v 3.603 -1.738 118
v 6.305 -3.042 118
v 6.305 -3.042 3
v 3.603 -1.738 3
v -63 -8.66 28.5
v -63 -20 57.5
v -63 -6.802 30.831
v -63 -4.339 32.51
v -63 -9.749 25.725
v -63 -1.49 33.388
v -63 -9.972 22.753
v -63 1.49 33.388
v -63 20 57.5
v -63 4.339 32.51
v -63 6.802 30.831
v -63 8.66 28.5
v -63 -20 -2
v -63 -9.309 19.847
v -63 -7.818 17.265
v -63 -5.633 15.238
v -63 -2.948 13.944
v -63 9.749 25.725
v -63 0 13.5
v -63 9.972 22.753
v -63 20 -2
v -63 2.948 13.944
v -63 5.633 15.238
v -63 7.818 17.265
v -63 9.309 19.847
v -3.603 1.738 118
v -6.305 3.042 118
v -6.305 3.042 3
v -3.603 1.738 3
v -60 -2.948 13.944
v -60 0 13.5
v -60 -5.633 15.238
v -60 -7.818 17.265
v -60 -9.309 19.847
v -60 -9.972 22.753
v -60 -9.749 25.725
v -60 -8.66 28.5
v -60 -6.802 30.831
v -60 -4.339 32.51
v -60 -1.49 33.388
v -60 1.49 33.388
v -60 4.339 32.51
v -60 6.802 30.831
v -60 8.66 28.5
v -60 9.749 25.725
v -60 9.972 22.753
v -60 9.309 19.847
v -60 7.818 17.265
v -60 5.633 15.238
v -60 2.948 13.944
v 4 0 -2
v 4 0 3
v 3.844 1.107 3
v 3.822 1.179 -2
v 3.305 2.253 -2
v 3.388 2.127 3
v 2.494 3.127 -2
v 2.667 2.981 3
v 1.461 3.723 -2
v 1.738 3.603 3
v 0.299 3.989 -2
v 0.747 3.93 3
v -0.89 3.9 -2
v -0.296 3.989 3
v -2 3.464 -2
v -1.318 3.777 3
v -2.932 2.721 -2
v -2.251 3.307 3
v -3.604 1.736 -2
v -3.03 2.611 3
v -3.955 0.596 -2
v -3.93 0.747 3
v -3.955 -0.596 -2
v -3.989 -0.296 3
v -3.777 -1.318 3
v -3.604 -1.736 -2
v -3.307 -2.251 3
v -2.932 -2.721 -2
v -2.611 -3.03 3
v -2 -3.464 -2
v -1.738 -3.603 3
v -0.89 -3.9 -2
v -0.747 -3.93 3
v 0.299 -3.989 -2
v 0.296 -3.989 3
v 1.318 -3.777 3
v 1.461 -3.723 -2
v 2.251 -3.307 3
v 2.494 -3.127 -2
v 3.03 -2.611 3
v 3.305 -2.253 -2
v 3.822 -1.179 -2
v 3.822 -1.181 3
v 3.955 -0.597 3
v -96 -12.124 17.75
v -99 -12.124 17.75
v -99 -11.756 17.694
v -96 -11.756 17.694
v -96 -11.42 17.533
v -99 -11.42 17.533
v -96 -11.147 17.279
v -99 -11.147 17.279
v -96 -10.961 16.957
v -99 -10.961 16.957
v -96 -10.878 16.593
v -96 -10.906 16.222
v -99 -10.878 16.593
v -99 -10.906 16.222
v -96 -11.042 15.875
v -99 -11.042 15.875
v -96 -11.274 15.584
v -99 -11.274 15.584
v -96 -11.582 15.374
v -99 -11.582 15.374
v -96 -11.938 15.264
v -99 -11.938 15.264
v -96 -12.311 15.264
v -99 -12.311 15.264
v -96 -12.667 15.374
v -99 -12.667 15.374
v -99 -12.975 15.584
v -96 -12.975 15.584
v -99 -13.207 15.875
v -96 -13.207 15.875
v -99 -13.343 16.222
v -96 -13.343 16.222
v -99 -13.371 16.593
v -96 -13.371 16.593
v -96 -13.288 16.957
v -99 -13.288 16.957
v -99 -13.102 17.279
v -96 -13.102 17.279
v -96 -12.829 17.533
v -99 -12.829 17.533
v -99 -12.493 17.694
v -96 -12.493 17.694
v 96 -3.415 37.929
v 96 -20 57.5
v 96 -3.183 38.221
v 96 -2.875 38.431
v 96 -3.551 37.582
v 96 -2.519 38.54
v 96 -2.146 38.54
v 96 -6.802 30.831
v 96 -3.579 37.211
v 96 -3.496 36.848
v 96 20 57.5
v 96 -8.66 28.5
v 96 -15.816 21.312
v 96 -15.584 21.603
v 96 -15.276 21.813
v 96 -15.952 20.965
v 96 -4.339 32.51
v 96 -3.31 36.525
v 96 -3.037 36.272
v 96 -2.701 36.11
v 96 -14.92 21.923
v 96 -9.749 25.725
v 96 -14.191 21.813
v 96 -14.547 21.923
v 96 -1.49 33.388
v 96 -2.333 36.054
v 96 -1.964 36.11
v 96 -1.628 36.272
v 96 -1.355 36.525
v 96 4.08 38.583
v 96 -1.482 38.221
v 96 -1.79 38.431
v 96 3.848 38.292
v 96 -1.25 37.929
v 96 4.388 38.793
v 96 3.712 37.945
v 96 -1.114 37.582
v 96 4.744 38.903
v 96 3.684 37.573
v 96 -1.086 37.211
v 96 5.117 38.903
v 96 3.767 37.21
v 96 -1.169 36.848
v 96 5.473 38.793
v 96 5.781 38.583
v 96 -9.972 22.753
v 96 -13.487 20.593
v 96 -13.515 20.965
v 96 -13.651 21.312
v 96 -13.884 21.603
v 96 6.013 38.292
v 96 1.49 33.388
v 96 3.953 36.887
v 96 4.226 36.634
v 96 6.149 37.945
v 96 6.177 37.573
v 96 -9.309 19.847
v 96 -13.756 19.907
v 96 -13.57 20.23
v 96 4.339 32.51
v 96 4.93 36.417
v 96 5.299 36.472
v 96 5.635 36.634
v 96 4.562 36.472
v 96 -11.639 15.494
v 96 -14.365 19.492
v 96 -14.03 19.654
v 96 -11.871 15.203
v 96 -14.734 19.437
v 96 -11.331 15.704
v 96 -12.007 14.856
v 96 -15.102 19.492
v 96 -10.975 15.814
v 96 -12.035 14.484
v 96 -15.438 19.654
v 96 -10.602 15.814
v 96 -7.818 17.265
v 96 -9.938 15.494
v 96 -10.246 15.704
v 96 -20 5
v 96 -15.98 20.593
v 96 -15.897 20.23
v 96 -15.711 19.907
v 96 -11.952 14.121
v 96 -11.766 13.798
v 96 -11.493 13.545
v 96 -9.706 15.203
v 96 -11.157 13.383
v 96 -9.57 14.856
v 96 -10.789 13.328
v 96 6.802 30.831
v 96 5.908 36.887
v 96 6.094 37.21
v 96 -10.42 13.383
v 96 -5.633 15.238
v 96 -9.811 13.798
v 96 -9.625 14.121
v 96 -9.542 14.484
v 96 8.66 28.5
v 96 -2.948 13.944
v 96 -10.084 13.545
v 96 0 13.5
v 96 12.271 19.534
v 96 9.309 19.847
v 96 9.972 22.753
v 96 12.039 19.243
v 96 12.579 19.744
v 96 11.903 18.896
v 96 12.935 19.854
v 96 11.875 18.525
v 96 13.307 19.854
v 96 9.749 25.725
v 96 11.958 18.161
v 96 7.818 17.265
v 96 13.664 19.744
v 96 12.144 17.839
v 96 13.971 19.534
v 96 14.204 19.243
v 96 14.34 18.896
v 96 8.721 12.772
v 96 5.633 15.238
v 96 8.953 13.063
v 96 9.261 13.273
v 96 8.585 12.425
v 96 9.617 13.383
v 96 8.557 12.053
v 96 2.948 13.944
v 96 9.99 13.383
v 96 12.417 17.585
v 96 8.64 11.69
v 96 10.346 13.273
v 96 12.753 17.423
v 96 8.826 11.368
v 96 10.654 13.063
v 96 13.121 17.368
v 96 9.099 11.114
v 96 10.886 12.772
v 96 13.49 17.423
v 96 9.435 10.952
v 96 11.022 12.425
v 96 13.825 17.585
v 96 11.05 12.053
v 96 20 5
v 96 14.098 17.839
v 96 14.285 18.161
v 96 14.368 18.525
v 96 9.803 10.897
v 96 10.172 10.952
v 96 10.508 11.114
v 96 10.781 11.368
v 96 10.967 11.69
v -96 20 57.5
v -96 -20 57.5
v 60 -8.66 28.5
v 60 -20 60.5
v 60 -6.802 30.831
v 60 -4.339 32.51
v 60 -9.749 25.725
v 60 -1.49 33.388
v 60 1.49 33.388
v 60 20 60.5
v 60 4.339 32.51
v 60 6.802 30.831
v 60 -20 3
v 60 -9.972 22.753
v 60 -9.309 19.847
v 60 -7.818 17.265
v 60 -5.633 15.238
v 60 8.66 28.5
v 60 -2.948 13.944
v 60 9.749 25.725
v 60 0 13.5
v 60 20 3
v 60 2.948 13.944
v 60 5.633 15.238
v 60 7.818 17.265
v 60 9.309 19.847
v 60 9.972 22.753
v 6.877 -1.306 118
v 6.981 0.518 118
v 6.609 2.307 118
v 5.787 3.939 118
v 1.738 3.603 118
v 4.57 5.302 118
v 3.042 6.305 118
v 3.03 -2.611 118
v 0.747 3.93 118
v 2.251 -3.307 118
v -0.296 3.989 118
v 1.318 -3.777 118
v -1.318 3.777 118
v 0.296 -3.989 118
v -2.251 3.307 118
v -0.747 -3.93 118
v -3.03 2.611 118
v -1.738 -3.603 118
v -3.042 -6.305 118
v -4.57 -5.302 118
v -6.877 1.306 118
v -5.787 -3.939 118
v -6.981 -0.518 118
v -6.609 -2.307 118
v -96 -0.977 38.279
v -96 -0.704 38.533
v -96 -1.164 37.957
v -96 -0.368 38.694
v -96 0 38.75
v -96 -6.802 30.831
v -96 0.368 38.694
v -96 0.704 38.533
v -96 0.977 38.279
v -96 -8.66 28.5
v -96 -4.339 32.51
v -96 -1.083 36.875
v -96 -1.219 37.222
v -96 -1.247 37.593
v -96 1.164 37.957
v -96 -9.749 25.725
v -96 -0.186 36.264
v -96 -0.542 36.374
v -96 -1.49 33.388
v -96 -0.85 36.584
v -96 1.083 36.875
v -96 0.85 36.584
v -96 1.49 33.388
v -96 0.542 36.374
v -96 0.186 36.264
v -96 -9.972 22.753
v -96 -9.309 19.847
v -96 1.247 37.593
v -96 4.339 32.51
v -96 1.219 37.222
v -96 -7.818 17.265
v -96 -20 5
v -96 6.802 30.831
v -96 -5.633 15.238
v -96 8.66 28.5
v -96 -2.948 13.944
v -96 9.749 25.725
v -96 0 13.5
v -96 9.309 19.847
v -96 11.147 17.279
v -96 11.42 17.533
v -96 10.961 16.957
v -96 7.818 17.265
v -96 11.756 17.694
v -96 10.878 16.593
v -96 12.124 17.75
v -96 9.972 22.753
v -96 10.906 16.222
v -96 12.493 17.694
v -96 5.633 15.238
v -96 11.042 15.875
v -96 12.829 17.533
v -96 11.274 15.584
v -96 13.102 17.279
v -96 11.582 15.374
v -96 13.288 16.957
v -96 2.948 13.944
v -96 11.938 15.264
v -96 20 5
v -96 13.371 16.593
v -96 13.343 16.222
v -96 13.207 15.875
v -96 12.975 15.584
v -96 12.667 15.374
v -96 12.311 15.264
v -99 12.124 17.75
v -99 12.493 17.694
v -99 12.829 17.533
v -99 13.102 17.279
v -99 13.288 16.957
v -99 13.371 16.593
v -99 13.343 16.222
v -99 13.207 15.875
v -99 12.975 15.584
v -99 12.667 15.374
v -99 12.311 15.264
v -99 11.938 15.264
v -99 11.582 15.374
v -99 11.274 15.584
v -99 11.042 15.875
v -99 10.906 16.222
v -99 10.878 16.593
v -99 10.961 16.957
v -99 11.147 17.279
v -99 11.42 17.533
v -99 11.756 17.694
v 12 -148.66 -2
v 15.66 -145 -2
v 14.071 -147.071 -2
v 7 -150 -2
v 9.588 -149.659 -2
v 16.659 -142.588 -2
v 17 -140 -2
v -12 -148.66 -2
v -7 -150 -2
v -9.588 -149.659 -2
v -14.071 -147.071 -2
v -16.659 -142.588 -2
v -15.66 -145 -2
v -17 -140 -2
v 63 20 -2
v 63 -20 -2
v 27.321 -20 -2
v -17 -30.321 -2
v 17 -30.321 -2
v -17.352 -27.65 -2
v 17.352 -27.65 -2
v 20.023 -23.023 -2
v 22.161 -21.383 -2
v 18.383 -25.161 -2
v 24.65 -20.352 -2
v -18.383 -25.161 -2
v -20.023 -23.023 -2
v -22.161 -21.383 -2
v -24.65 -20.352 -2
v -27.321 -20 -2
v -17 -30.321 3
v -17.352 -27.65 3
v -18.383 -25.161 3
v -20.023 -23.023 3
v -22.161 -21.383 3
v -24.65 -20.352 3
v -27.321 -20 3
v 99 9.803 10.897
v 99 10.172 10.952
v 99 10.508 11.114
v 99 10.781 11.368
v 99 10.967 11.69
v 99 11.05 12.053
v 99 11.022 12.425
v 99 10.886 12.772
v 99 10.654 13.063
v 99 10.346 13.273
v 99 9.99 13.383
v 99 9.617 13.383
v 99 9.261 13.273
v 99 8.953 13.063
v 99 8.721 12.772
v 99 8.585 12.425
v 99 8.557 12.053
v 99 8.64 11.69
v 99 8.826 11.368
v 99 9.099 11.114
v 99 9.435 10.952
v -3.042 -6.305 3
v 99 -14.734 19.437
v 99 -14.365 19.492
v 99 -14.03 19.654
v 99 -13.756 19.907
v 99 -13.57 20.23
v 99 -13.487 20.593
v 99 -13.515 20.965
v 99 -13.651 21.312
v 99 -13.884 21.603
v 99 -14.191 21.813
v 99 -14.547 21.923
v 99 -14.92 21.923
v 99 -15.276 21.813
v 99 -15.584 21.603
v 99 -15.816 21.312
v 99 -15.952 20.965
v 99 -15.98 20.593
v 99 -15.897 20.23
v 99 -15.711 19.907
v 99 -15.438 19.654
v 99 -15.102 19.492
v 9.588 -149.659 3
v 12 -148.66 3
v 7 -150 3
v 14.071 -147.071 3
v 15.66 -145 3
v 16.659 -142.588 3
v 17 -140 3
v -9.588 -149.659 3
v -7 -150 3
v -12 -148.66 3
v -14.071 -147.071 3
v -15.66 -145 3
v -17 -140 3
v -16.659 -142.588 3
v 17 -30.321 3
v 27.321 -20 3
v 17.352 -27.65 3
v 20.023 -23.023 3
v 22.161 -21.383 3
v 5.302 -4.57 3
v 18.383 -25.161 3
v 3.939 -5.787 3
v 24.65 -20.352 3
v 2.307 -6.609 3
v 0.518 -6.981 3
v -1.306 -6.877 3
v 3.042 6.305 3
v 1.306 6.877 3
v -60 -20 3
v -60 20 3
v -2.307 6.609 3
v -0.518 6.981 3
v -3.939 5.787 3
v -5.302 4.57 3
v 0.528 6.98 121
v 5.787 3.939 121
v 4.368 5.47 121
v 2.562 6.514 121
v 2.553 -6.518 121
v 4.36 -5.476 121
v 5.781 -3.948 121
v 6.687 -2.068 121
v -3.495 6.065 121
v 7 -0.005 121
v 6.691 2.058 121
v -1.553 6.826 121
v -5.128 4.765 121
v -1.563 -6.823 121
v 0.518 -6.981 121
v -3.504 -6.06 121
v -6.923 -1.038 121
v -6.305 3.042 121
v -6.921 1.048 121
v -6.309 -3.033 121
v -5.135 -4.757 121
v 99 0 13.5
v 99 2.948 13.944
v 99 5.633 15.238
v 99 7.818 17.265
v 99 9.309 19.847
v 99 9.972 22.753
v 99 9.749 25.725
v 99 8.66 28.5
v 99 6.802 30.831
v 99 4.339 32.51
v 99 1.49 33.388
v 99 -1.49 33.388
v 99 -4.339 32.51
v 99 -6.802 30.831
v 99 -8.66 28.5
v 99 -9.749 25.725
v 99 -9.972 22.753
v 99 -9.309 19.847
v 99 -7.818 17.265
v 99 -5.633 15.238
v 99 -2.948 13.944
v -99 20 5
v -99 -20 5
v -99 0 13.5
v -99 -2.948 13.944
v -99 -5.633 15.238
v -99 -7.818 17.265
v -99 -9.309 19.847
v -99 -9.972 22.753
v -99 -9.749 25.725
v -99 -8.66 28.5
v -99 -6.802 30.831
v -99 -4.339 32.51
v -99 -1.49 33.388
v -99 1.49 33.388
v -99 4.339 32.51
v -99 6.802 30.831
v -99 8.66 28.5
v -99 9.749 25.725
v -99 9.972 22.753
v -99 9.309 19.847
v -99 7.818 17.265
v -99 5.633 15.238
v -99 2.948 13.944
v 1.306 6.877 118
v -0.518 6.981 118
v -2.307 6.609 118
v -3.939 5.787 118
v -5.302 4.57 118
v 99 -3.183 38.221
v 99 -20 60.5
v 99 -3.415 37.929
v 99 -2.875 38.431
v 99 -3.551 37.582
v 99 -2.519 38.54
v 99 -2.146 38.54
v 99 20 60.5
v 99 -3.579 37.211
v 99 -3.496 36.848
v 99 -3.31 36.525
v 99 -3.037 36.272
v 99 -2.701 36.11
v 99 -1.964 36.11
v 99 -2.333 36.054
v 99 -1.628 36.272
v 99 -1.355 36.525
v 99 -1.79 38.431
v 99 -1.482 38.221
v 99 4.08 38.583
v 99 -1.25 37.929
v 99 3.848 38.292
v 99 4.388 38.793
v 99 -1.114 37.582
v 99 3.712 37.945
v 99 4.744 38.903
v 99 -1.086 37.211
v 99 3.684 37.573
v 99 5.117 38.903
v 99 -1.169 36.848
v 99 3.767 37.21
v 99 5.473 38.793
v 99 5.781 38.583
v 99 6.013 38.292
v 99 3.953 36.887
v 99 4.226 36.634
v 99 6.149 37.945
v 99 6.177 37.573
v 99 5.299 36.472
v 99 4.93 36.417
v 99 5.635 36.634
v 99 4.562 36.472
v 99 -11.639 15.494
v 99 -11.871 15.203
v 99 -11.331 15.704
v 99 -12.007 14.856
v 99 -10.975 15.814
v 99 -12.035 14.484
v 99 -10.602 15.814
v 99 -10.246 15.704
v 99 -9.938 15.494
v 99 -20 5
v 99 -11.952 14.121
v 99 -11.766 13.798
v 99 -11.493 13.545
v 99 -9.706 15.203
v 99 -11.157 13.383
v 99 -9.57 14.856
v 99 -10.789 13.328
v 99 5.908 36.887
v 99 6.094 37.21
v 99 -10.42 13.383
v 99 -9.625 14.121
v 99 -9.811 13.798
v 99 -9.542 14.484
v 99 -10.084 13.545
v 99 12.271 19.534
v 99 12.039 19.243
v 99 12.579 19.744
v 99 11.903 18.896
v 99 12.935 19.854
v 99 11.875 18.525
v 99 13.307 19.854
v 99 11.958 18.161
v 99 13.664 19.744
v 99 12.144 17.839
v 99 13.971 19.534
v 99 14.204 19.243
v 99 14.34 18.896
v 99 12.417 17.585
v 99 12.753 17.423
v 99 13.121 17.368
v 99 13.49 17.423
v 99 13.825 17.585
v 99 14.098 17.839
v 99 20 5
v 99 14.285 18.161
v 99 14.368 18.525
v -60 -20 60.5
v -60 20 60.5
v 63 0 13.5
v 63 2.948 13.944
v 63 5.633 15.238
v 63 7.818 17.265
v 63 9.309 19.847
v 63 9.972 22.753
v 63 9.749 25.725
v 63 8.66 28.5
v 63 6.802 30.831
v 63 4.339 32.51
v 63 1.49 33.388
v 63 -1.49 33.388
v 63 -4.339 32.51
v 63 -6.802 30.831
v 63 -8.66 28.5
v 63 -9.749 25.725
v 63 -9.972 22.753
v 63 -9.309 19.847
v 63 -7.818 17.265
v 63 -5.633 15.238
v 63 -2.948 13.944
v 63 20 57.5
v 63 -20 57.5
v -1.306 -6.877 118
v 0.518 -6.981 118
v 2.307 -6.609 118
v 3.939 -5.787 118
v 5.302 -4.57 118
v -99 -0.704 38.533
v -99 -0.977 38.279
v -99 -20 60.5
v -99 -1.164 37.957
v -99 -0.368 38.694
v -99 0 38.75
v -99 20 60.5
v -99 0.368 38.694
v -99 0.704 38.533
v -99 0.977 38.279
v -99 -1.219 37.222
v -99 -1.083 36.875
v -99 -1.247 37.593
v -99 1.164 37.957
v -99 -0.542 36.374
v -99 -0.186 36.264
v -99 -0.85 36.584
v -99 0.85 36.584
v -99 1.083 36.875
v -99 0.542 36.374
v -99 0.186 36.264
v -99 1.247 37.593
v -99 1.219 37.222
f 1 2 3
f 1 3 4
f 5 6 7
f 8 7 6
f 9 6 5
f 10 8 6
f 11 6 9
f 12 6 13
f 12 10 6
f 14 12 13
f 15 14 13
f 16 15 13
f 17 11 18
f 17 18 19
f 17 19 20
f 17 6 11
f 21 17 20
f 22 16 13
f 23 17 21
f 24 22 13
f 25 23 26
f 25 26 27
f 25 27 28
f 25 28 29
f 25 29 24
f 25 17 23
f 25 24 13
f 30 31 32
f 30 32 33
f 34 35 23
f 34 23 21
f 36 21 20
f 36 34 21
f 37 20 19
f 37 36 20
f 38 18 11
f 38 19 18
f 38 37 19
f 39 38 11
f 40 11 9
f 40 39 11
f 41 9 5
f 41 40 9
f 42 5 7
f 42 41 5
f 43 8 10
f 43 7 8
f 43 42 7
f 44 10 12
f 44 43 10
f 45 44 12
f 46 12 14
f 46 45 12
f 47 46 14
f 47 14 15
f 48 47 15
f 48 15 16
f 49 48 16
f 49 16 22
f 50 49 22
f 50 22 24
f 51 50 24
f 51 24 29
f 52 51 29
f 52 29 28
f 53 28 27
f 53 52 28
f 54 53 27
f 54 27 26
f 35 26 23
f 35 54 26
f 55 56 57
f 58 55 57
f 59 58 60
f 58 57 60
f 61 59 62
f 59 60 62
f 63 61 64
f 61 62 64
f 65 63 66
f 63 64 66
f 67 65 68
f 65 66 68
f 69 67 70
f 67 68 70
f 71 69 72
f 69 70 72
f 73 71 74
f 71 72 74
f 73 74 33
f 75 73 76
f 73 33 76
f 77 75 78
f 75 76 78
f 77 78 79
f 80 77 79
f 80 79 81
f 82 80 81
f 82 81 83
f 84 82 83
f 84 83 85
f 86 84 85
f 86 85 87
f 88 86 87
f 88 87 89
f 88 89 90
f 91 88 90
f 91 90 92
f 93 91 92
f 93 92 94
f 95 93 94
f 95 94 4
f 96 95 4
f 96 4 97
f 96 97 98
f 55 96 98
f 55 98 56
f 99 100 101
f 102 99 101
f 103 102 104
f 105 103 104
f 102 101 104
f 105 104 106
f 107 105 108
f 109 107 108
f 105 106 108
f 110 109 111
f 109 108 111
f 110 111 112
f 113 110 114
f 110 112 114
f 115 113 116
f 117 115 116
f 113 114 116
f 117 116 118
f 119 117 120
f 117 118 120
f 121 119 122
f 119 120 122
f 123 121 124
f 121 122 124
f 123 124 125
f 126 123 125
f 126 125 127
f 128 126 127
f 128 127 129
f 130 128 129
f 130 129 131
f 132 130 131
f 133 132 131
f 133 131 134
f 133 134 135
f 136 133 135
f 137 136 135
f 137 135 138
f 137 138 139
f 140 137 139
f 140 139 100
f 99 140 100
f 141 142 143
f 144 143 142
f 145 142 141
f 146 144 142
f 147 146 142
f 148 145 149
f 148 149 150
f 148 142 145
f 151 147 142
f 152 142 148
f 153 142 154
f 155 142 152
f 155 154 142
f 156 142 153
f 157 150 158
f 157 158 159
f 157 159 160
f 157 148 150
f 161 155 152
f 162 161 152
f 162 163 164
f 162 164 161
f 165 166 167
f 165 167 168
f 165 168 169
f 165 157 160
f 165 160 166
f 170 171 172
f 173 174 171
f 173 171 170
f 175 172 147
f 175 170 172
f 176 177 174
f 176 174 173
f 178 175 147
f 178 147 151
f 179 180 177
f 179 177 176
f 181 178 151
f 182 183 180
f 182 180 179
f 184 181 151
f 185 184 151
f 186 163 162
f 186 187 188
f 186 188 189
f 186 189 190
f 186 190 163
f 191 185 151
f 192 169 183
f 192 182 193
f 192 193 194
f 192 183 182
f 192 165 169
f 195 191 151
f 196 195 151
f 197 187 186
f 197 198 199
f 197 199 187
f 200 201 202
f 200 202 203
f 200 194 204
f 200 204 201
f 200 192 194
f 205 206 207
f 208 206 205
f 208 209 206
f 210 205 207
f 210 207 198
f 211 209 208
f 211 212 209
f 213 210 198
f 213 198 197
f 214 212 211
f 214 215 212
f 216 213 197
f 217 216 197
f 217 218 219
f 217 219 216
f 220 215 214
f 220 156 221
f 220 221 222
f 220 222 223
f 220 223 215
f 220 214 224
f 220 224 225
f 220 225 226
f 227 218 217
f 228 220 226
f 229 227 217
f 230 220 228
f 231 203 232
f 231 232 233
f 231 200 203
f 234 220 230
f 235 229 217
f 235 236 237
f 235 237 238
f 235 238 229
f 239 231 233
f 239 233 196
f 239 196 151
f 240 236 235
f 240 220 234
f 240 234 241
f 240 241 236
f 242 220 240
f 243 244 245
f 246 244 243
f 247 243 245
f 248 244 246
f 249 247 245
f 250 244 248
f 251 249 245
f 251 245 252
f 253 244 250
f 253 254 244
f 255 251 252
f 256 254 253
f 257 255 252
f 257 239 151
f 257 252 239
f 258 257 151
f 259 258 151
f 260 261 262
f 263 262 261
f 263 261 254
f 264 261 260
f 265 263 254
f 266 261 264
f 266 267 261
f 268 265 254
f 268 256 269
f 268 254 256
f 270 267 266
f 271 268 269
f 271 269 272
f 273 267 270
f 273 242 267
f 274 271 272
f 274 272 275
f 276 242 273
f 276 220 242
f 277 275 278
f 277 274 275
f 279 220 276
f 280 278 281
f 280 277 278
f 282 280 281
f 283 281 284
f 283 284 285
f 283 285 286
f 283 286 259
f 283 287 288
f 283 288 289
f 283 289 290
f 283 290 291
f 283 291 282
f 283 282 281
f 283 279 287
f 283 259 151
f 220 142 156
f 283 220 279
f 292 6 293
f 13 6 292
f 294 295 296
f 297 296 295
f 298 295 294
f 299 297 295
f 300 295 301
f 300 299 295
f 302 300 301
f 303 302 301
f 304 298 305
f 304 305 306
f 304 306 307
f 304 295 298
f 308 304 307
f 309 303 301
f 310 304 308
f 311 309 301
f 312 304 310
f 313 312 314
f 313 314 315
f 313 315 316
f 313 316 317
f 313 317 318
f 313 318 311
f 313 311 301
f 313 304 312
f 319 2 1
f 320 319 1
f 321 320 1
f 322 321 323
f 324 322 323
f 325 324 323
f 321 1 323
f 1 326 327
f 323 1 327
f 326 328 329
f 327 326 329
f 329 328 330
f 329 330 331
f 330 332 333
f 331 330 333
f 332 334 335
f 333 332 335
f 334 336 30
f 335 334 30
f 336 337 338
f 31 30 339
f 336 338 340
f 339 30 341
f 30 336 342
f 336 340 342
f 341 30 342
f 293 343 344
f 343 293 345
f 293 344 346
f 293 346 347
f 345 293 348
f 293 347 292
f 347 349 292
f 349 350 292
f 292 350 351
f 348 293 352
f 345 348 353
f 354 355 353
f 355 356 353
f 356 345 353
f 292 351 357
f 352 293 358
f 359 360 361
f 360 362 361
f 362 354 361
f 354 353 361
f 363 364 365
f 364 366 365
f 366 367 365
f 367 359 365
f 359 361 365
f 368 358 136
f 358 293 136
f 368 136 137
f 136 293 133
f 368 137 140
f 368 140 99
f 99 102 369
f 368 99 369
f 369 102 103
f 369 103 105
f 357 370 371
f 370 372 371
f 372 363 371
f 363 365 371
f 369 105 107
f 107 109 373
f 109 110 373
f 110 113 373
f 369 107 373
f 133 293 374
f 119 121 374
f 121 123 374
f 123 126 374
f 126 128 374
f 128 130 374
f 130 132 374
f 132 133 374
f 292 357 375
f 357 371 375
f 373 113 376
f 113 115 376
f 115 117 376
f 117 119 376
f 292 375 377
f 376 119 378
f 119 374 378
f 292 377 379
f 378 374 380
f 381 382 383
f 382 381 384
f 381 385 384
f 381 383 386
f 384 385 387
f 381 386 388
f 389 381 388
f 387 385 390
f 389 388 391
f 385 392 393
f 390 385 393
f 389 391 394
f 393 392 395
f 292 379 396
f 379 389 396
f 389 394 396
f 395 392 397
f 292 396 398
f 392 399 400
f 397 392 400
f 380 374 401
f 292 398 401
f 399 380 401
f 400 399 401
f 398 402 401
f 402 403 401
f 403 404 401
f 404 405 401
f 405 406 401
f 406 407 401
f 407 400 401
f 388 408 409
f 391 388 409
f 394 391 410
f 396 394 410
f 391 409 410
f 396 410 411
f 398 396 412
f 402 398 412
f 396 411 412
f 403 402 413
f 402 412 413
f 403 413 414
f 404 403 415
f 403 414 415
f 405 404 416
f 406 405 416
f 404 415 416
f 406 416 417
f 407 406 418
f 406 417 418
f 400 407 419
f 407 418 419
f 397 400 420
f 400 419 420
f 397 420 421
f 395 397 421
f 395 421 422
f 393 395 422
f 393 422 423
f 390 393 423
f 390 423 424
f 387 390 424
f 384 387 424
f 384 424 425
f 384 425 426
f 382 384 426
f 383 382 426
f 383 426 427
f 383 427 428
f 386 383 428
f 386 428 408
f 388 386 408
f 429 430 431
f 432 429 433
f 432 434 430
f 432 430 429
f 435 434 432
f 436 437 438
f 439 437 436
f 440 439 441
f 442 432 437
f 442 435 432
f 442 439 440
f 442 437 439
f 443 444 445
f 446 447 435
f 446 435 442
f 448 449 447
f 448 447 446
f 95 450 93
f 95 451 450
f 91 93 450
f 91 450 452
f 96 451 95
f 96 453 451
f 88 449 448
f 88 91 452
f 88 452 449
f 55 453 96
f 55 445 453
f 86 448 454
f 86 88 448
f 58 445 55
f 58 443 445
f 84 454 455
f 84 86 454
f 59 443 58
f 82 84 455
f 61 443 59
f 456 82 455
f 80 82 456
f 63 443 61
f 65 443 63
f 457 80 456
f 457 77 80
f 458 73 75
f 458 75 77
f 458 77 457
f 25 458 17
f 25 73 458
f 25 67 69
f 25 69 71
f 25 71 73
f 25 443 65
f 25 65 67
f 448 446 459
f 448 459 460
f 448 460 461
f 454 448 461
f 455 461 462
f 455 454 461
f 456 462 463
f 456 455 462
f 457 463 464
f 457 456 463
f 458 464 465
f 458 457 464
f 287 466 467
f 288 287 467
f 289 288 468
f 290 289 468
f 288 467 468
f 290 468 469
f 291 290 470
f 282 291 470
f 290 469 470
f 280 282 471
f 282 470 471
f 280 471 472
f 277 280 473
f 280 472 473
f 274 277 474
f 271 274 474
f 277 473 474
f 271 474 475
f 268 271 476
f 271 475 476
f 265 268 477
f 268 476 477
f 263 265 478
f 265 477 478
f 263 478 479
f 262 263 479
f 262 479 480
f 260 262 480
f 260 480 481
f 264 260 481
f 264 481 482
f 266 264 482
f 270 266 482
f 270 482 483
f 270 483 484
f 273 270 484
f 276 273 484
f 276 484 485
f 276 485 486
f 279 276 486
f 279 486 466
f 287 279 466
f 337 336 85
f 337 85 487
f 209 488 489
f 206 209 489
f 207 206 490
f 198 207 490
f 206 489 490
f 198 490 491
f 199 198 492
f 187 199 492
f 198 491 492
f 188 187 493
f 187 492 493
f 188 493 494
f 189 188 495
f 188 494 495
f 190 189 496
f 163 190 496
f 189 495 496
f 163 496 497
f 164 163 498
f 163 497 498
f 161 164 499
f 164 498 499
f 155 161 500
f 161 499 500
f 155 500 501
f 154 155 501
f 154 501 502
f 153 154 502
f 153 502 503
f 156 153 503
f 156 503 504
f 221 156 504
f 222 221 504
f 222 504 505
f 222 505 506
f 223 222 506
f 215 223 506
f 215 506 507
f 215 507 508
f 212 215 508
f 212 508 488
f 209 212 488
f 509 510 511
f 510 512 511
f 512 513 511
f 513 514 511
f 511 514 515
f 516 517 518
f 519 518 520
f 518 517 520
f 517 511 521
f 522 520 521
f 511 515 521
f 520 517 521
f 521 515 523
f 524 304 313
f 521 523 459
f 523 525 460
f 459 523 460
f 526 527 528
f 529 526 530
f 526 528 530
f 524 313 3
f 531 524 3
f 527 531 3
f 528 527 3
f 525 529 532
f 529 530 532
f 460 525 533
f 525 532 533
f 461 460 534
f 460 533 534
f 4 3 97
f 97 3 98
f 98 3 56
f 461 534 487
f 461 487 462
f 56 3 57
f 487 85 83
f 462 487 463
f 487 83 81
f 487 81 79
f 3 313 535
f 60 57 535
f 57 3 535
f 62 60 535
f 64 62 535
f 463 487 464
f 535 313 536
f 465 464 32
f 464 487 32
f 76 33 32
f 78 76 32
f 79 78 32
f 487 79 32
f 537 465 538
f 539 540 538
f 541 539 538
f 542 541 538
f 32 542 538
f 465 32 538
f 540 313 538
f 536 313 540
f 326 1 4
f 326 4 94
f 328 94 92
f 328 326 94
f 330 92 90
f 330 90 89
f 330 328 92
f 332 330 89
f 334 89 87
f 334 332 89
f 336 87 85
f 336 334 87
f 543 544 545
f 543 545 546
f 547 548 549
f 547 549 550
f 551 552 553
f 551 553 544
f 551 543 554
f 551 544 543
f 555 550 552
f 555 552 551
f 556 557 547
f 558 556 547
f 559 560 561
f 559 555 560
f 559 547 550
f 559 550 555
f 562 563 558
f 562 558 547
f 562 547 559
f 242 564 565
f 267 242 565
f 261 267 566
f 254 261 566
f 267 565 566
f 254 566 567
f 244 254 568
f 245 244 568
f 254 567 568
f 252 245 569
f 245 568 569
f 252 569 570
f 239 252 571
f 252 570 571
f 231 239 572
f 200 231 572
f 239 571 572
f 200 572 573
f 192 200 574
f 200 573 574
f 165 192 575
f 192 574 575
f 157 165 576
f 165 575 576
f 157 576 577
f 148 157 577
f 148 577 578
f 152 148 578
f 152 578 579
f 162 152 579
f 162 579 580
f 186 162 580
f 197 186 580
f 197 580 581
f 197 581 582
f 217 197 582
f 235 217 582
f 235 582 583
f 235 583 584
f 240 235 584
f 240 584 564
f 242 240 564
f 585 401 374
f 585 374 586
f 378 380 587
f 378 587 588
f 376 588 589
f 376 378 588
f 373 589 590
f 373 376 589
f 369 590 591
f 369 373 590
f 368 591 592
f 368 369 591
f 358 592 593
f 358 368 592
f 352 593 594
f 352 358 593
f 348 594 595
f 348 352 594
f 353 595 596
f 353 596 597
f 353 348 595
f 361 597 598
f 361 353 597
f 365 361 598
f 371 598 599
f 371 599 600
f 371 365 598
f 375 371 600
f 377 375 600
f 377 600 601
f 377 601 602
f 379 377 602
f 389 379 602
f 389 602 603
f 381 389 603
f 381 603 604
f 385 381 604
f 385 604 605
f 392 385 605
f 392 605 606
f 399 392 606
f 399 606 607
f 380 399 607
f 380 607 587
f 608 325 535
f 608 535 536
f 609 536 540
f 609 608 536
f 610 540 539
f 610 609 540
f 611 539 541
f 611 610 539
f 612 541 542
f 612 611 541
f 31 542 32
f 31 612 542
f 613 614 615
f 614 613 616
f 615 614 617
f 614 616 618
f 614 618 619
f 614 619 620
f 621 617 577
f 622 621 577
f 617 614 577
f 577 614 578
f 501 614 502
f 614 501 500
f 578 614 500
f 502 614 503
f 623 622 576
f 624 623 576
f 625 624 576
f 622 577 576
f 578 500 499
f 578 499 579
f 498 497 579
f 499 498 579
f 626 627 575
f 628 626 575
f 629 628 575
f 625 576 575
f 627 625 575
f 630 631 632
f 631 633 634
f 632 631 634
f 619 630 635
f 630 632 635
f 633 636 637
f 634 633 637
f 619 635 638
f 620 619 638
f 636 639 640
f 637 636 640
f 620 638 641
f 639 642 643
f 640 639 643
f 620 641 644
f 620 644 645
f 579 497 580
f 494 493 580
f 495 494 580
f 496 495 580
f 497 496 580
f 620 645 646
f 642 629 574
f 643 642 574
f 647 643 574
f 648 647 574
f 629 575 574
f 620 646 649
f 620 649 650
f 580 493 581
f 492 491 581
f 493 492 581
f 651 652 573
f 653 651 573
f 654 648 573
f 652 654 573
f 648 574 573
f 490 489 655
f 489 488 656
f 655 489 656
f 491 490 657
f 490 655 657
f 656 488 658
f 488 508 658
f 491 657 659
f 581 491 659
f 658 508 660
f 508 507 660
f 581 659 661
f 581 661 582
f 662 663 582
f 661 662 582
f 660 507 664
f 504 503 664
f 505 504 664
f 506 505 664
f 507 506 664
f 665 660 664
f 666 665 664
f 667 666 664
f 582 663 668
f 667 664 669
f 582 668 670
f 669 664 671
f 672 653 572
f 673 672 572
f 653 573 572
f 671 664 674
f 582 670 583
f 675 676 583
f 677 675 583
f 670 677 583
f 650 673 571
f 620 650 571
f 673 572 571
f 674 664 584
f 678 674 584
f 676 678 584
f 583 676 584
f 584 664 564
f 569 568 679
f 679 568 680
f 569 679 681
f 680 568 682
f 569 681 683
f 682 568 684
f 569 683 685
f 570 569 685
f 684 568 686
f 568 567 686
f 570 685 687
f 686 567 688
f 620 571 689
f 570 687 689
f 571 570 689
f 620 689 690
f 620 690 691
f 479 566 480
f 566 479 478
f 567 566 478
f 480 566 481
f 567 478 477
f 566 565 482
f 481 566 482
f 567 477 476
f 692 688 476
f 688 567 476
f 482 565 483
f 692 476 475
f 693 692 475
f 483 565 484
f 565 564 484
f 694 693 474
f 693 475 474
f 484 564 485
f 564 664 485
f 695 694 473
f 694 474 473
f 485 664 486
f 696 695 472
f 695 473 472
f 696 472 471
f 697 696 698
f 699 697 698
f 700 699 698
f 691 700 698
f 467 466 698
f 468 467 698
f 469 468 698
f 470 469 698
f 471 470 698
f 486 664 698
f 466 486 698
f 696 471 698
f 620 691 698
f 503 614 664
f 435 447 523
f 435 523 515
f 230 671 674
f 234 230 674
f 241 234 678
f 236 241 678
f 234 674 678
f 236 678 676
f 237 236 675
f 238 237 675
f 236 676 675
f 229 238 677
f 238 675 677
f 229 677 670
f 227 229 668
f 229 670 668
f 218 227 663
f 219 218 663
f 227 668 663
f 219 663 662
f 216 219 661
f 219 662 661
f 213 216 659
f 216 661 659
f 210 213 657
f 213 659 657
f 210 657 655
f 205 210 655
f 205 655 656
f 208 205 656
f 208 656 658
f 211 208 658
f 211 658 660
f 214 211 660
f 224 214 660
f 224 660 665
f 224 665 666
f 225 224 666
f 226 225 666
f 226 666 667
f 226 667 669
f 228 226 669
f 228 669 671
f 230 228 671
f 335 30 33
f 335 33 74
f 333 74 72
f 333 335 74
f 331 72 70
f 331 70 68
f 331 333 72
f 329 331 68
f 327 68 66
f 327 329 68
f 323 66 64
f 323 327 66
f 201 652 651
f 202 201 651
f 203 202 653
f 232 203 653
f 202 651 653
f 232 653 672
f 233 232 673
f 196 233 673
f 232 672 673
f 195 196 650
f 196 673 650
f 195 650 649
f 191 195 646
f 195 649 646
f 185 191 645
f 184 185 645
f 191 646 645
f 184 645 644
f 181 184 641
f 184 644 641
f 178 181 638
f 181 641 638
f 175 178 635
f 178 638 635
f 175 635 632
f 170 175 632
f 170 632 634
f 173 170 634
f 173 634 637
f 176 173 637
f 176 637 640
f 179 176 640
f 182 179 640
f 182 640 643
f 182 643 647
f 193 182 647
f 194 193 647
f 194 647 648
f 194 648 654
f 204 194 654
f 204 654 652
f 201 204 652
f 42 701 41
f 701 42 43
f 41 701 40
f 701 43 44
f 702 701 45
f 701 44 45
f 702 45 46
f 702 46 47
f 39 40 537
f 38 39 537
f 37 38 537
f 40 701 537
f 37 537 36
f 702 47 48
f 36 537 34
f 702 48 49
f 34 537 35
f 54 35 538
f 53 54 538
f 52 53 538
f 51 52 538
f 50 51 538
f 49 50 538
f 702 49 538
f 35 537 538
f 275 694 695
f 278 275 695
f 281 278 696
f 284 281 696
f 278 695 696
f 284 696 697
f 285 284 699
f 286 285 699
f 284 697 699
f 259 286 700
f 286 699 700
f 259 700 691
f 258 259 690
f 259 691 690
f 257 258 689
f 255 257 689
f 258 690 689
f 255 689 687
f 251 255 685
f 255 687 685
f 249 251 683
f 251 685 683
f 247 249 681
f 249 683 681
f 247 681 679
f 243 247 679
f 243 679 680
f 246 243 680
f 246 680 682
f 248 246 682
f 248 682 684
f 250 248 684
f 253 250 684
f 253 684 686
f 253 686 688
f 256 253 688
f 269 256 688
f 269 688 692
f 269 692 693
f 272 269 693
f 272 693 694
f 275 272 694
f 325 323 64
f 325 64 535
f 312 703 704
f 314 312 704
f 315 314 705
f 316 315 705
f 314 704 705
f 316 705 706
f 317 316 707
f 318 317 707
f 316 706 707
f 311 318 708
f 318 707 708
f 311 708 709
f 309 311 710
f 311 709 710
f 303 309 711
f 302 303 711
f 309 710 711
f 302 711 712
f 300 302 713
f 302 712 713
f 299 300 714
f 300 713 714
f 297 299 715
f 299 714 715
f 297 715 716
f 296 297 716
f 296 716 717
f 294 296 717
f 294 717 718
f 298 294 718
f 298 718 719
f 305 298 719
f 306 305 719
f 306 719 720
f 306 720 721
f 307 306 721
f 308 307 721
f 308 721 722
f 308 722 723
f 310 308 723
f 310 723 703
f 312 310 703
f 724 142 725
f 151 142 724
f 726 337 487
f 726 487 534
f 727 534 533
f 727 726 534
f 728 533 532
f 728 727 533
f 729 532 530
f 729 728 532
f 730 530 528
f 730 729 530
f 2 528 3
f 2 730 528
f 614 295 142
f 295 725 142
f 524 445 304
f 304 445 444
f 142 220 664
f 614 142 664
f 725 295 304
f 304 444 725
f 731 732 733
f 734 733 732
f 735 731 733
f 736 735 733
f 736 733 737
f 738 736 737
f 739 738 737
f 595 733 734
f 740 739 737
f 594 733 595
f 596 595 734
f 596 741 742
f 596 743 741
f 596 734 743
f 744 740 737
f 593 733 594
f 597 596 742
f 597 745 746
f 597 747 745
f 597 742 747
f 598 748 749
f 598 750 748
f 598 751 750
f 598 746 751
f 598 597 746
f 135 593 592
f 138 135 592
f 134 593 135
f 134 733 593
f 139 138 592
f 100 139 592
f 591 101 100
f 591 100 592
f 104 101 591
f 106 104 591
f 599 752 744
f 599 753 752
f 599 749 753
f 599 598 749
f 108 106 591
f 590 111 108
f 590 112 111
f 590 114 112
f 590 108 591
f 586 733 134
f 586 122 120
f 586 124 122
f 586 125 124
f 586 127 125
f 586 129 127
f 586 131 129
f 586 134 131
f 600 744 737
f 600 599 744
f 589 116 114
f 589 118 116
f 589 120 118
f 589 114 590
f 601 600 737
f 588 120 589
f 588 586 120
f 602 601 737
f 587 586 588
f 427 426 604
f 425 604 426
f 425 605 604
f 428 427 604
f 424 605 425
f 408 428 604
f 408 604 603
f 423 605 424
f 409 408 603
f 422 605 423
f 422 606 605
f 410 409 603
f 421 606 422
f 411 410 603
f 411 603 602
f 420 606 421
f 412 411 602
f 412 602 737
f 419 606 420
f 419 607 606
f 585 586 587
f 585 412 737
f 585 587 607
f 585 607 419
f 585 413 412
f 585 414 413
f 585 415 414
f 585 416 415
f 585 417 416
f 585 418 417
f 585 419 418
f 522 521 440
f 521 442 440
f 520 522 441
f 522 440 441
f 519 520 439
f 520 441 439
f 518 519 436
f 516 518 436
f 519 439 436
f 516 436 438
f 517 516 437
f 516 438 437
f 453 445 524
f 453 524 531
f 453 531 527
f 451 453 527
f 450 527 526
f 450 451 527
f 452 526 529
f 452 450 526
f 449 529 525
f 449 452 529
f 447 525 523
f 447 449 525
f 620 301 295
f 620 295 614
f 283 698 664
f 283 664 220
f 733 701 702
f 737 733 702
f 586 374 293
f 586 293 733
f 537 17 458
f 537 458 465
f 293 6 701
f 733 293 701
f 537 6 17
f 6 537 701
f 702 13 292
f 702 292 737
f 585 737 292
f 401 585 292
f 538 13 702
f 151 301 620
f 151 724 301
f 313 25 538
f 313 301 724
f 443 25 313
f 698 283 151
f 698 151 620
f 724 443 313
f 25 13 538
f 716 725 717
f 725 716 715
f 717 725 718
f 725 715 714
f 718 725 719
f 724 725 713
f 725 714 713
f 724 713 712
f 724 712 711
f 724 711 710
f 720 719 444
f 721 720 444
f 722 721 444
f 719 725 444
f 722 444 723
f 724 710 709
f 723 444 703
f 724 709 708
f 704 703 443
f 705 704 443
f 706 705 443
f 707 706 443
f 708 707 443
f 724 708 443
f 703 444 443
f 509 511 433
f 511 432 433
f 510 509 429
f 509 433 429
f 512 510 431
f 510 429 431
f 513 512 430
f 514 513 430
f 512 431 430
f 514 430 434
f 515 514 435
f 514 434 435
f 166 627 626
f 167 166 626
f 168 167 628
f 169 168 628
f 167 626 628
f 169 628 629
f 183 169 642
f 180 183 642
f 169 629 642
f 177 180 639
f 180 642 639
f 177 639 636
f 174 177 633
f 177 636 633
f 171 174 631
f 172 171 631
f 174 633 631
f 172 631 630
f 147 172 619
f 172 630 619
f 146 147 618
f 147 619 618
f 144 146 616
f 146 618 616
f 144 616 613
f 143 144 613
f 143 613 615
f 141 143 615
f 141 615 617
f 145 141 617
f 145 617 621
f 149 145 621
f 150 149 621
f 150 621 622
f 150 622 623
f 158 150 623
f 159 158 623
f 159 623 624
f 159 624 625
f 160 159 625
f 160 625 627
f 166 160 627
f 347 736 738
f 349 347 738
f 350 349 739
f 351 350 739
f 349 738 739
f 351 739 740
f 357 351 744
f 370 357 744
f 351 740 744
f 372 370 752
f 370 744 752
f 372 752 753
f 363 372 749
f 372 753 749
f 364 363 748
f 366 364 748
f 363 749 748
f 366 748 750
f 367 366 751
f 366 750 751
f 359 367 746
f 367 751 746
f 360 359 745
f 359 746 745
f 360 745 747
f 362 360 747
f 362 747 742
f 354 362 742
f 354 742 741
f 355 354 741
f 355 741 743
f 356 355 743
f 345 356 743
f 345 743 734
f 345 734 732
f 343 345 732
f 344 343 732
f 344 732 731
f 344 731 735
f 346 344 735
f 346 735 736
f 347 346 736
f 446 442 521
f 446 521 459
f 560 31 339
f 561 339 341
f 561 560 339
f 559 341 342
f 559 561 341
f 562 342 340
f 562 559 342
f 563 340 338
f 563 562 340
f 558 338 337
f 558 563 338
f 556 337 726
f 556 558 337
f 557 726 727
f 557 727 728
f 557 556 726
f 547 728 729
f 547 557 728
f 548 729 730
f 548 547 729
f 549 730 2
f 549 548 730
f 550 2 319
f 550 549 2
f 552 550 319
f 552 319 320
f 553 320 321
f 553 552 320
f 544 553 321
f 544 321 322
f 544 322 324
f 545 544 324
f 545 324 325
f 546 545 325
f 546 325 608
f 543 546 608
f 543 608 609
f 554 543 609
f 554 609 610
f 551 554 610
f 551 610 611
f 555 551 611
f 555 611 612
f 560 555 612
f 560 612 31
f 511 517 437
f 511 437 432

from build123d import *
from build123d.topology import SkipClean

# Parameters (mm, degrees)
BOSS_EXTRUDE2_DEPTH      = 3
BOSS_EXTRUDE2_DEPTH_BACK = 2
SKETCH2_W                = 3
SKETCH2_H                = 40
BOSS_EXTRUDE4_DEPTH      = 39
SKETCH3_W                = 1
SKETCH3_H                = 40
BOSS_EXTRUDE5_DEPTH      = 36
SKETCH4_W                = 1
SKETCH4_H                = 40
BOSS_EXTRUDE6_DEPTH      = 36
SKETCH5_W                = 3
SKETCH5_H                = 40
BOSS_EXTRUDE7_DEPTH      = 36
SKETCH6_R                = 4
CUT_EXTRUDE1_DEPTH       = 228.764510235
CUT_EXTRUDE2_DEPTH       = 36
BOSS_EXTRUDE10_START     = 115
BOSS_EXTRUDE10_DEPTH     = 115
BOSS_EXTRUDE11_START     = 3
SKETCH11_R               = 7
BOSS_EXTRUDE11_DEPTH     = 3
SKETCH12_R               = 10
CUT_EXTRUDE4_DEPTH       = 67
CUT_EXTRUDE5_START       = -67
SKETCH13_R               = 10
CUT_EXTRUDE5_DEPTH       = 67
SKETCH15_W               = 39
SKETCH15_H               = 40
BOSS_EXTRUDE12_DEPTH     = 2
SKETCH16_W               = 33
SKETCH16_H               = 40
CUT_EXTRUDE6_DEPTH       = 52
SKETCH17_W               = 33
SKETCH17_H               = 40
CUT_EXTRUDE7_DEPTH       = 52
SKETCH18_W               = 3
SKETCH18_H               = 40
BOSS_EXTRUDE13_DEPTH     = 16.5
LPATTERN1_COUNT          = 2
LPATTERN1_PITCH          = 36
SKETCH19_W               = 3
SKETCH19_H               = 40
BOSS_EXTRUDE14_DEPTH     = 16.5
LPATTERN2_COUNT          = 2
LPATTERN2_PITCH          = 36
SKETCH21_W               = 3
SKETCH21_H               = 40
BOSS_EXTRUDE16_DEPTH     = 35
SKETCH22_W               = 3
SKETCH22_H               = 40
BOSS_EXTRUDE17_DEPTH     = 35
SKETCH27_R               = 1.25
CUT_EXTRUDE16_DEPTH      = 21
SKETCH29_W               = 32
SKETCH29_H               = 40
CUT_EXTRUDE19_DEPTH      = 10
SKETCH30_W               = 34.030572501
SKETCH30_H               = 34.181917291
CUT_EXTRUDE20_DEPTH      = 10
FILLET1_R                = 10
SKETCH31_R               = 1.25
CUT_EXTRUDE21_DEPTH      = 10


with BuildPart() as part:
    # Sketch1 → Boss-Extrude2 (new, two sides: drawn at the far end of the back side and taken through both)
    with BuildSketch(Plane.XY.offset(-BOSS_EXTRUDE2_DEPTH_BACK)):
        with BuildLine():
            Line((-95, 20), (95, 20))
            Line((95, 20), (95, -20))
            Line((95, -20), (27.321334375, -20))
            ThreePointArc((27.321334375, -20), (20.023048847, -23.023048847), (17, -30.321334375))
            Line((17, -30.321334375), (17, -182.194050733))
            Line((17, -182.194050733), (-17, -182.194050733))
            Line((-17, -182.194050733), (-17, -30.321334375))
            ThreePointArc((-17, -30.321334375), (-20.023048847, -23.023048847), (-27.321334375, -20))
            Line((-27.321334375, -20), (-95, -20))
            Line((-95, -20), (-95, 20))
        make_face()
    extrude(amount=BOSS_EXTRUDE2_DEPTH + BOSS_EXTRUDE2_DEPTH_BACK)

    # Sketch2 → Boss-Extrude4 (add)
    with BuildSketch(Plane.XY.offset(3)):
        with Locations((-93.5, 0)):
            Rectangle(SKETCH2_W, SKETCH2_H)
        with Locations((93.5, 0)):
            Rectangle(SKETCH2_W, SKETCH2_H)
    extrude(amount=BOSS_EXTRUDE4_DEPTH)

    # Sketch3 → Boss-Extrude5 (add)
    with BuildSketch(Plane.ZY.offset(95)):
        with Locations((41.5, 0)):
            Rectangle(SKETCH3_W, SKETCH3_H)
    extrude(amount=BOSS_EXTRUDE5_DEPTH)

    # Sketch4 → Boss-Extrude6 (add)
    with BuildSketch(Plane(origin=(95, 0, 0), x_dir=(0, 0, -1), z_dir=(1, 0, 0))):
        with Locations((-41.5, 0)):
            Rectangle(SKETCH4_W, SKETCH4_H)
    extrude(amount=BOSS_EXTRUDE6_DEPTH)

    # Sketch5 → Boss-Extrude7 (add)
    with BuildSketch(Plane(origin=(0, 0, 41), x_dir=(-1, 0, 0), z_dir=(0, 0, -1))):
        with Locations((-129.5, 0)):
            Rectangle(SKETCH5_W, SKETCH5_H)
        with Locations((129.5, 0)):
            Rectangle(SKETCH5_W, SKETCH5_H)
    extrude(amount=BOSS_EXTRUDE7_DEPTH)

    # Sketch6 → Cut-Extrude1 (cut, through all)
    with BuildSketch(Plane.XY.offset(3)):
        Circle(SKETCH6_R)
    extrude(amount=-CUT_EXTRUDE1_DEPTH, mode=Mode.SUBTRACT)

    # Sketch7 → Cut-Extrude2 (cut)
    with BuildSketch(Plane.XY.offset(3)):
        with BuildLine():
            Line((-17, -182.194050733), (0, -182.194050733))
            ThreePointArc((0, -182.194050733), (-12.02081528, -177.214866013), (-17, -165.194050733))
            Line((-17, -165.194050733), (-17, -182.194050733))
        make_face()
        with BuildLine():
            ThreePointArc((17, -165.194050733), (12.02081528, -177.214866013), (0, -182.194050733))
            Line((0, -182.194050733), (17, -182.194050733))
            Line((17, -182.194050733), (17, -165.194050733))
        make_face()
    extrude(amount=-CUT_EXTRUDE2_DEPTH, mode=Mode.SUBTRACT)

    # Sketch8 → Boss-Extrude10 (add)
    with SkipClean():  # the faces are left unmerged after this step: merging them gives an invalid solid
        with BuildSketch(Plane.XY.offset(3).offset(BOSS_EXTRUDE10_START)):
            with BuildLine():
                Line((-6.304525909, 3.041866706), (-3.602586234, 1.738209546))
                ThreePointArc((-3.602586234, 1.738209546), (-1.318313398, 3.776512913), (1.738209546, 3.602586234))
                Line((1.738209546, 3.602586234), (3.041866706, 6.304525909))
                ThreePointArc((3.041866706, 6.304525909), (-2.307048447, 6.608897598), (-6.304525909, 3.041866706))
            make_face()
            with BuildLine():
                Line((6.304525909, -3.041866706), (3.602586234, -1.738209546))
                ThreePointArc((3.602586234, -1.738209546), (1.318313398, -3.776512913), (-1.738209546, -3.602586234))
                Line((-1.738209546, -3.602586234), (-3.041866706, -6.304525909))
                ThreePointArc((-3.041866706, -6.304525909), (2.307048447, -6.608897598), (6.304525909, -3.041866706))
            make_face()
        extrude(amount=-BOSS_EXTRUDE10_DEPTH)

    # Sketch11 → Boss-Extrude11 (add)
    with SkipClean():  # the faces are left unmerged after this step: merging them gives an invalid solid
        with BuildSketch(Plane.XY.offset(118).offset(BOSS_EXTRUDE11_START)):
            with Locations(Location((0, 0, 0), (0, 0, 154.243185034))):
                Circle(SKETCH11_R)
        extrude(amount=-BOSS_EXTRUDE11_DEPTH)

    # Sketch12 → Cut-Extrude4 (cut)
    with SkipClean():  # the faces are left unmerged after this step: merging them gives an invalid solid
        with BuildSketch(Plane(origin=(131, 0, 0), x_dir=(0, 0, -1), z_dir=(1, 0, 0))):
            with Locations((-23.5, 0)):
                Circle(SKETCH12_R)
        extrude(amount=-CUT_EXTRUDE4_DEPTH, mode=Mode.SUBTRACT)

    # Sketch13 → Cut-Extrude5 (cut)
    with SkipClean():  # the faces are left unmerged after this step: merging them gives an invalid solid
        with BuildSketch(Plane.ZY.offset(131).offset(CUT_EXTRUDE5_START)):
            with Locations(Location((23.5, 0, 0), (0, 0, 180))):
                Circle(SKETCH13_R)
        extrude(amount=CUT_EXTRUDE5_DEPTH, mode=Mode.SUBTRACT)

    # Sketch15 → Boss-Extrude12 (add)
    with SkipClean():  # the faces are left unmerged after this step: merging them gives an invalid solid
        with BuildSketch(Plane.XY.offset(42)):
            with Locations((-111.5, 0)):
                Rectangle(SKETCH15_W, SKETCH15_H)
        boss_extrude12 = extrude(amount=BOSS_EXTRUDE12_DEPTH)

    # Mirror1: Boss-Extrude12 across plane
    with SkipClean():  # the faces are left unmerged after this step: merging them gives an invalid solid
        add(boss_extrude12.mirror(Plane(origin=(0, 0, 0), x_dir=(0, 0, 1), z_dir=(1, 0, 0))))

    # Sketch16 → Cut-Extrude6 (cut)
    with SkipClean():  # the faces are left unmerged after this step: merging them gives an invalid solid
        with BuildSketch(Plane(origin=(0, 0, 41), x_dir=(-1, 0, 0), z_dir=(0, 0, -1))):
            with Locations((111.5, 0)):
                Rectangle(SKETCH16_W, SKETCH16_H)
        extrude(amount=-CUT_EXTRUDE6_DEPTH, mode=Mode.SUBTRACT)


with BuildPart() as cut_extrude6_piece_1:
    # of the separate pieces the step leaves, piece 1, a body of its own (cut_extrude6_pieces)
    add(part.part.solids().sort_by_distance((-92, 20, 3))[0])

    # Sketch17 → Cut-Extrude7 (cut)
    with SkipClean():  # the faces are left unmerged after this step: merging them gives an invalid solid
        with BuildSketch(Plane(origin=(0, 0, 41), x_dir=(-1, 0, 0), z_dir=(0, 0, -1))):
            with Locations((-111.5, 0)):
                Rectangle(SKETCH17_W, SKETCH17_H)
        extrude(amount=-CUT_EXTRUDE7_DEPTH, mode=Mode.SUBTRACT)


with BuildPart() as cut_extrude6_piece_2:
    # of the separate pieces the step leaves, piece 2, a body of its own (cut_extrude6_pieces)
    add(part.part.solids().sort_by_distance((-131, 20, 42))[0])


with BuildPart() as cut_extrude7_piece_1:
    # of the separate pieces the step leaves, piece 1, a body of its own (cut_extrude7_pieces)
    add(cut_extrude6_piece_1.part.solids().sort_by_distance((-92, 20, 3))[0])

    # Sketch18 → Boss-Extrude13 (add)
    with SkipClean():  # the faces are left unmerged after this step: merging them gives an invalid solid
        with BuildSketch(Plane.XY.offset(44)):
            with Locations((-93.5, 0)):
                Rectangle(SKETCH18_W, SKETCH18_H)
        boss_extrude13 = extrude(amount=BOSS_EXTRUDE13_DEPTH)

    # Sketch19 → Boss-Extrude14 (add)
    with SkipClean():  # the faces are left unmerged after this step: merging them gives an invalid solid
        with BuildSketch(Plane.XY.offset(44)):
            with Locations((93.5, 0)):
                Rectangle(SKETCH19_W, SKETCH19_H)
        boss_extrude14 = extrude(amount=BOSS_EXTRUDE14_DEPTH)



with BuildPart() as cut_extrude7_piece_2:
    # of the separate pieces the step leaves, piece 2, a body of its own (cut_extrude7_pieces)
    add(cut_extrude6_piece_1.part.solids().sort_by_distance((128, 20, 41))[0])

    # LPattern2: Boss-Extrude14 ×2
    with Locations(*[(i * LPATTERN2_PITCH, 0, 0) for i in range(1, LPATTERN2_COUNT)]):
        add(boss_extrude14)


with BuildPart() as cut_extrude6_piece_2_1:
    add(cut_extrude6_piece_2.part)

    # LPattern1: Boss-Extrude13 ×2
    with Locations(*[(-i * LPATTERN1_PITCH, 0, 0) for i in range(1, LPATTERN1_COUNT)]):
        add(boss_extrude13)



with BuildPart() as cut_extrude7_piece_1_1:
    with SkipClean():  # the faces are left unmerged after this step: merging them gives an invalid solid
        add(cut_extrude7_piece_1.part)

        add(cut_extrude7_piece_2.part)  # Boss-Extrude16 merges Cut-Extrude7 piece 2
        # Sketch21 → Boss-Extrude16 (add)
        with BuildSketch(Plane.ZY.offset(-128)):
            with Locations((59, 0)):
                Rectangle(SKETCH21_W, SKETCH21_H)
        extrude(amount=BOSS_EXTRUDE16_DEPTH)


with BuildPart() as cut_extrude6_piece_2_2:
    with SkipClean():  # the faces are left unmerged after this step: merging them gives an invalid solid
        add(cut_extrude6_piece_2_1.part)

        add(cut_extrude7_piece_1_1.part)  # Boss-Extrude17 merges Cut-Extrude7 piece 1
        # Sketch22 → Boss-Extrude17 (add)
        with BuildSketch(Plane.ZY.offset(95)):
            with Locations((59, 0)):
                Rectangle(SKETCH22_W, SKETCH22_H)
        extrude(amount=BOSS_EXTRUDE17_DEPTH)

    # Sketch27 → Cut-Extrude16 (cut)
    with SkipClean():  # the faces are left unmerged after this step: merging them gives an invalid solid
        with BuildSketch(Plane(origin=(131, 0, 0), x_dir=(0, 0, -1), z_dir=(1, 0, 0))):
            with Locations((-37.304307679, -2.332614308)):
                Circle(SKETCH27_R)
            with Locations((-18.617949409, 13.121188286)):
                Circle(SKETCH27_R)
            with Locations((-14.577742912, -10.788573977)):
                Circle(SKETCH27_R)
            with Locations((-20.686555586, -14.733788736)):
                Circle(SKETCH27_R)
            with Locations((-12.146886867, 9.803408703)):
                Circle(SKETCH27_R)
            with Locations((-37.666557547, 4.930380034)):
                Circle(SKETCH27_R)
        extrude(amount=-CUT_EXTRUDE16_DEPTH, mode=Mode.SUBTRACT)

    # Sketch29 → Cut-Extrude19 (cut)
    with SkipClean():  # the faces are left unmerged after this step: merging them gives an invalid solid
        with BuildSketch(Plane.XY.offset(3)):
            with Locations((76, 0)):
                Rectangle(SKETCH29_W, SKETCH29_H)
            with Locations((-76, 0)):
                Rectangle(SKETCH29_W, SKETCH29_H)
        extrude(amount=-CUT_EXTRUDE19_DEPTH, mode=Mode.SUBTRACT)


with BuildPart() as cut_extrude19_piece_1:
    # of the separate pieces the step leaves, piece 1, a body of its own (cut_extrude19_pieces)
    add(cut_extrude6_piece_2_2.part.solids().sort_by_distance((-60, 20, 3))[0])


with BuildPart() as cut_extrude19_piece_2:
    # of the separate pieces the step leaves, piece 2, a body of its own (cut_extrude19_pieces)
    add(cut_extrude6_piece_2_2.part.solids().sort_by_distance((-92, 20, 3))[0])


with BuildPart() as cut_extrude19_piece_3:
    # of the separate pieces the step leaves, piece 3, a body of its own (cut_extrude19_pieces)
    add(cut_extrude6_piece_2_2.part.solids().sort_by_distance((131, 20, 60.5))[0])


with BuildPart() as cut_extrude19_piece_2_1:
    # Body-Move/Copy3: read off the stored shape, not the designer's step
    # Body-Move/Copy3: moved
    add(cut_extrude19_piece_2.part.moved(Location((32, 0, 0))))


with BuildPart() as cut_extrude19_piece_3_1:
    # Body-Move/Copy4: read off the stored shape, not the designer's step
    # Body-Move/Copy4: moved
    add(cut_extrude19_piece_3.part.moved(Location((-32, 0, 0))))


with BuildPart() as cut_extrude19_piece_2_2:
    add(cut_extrude19_piece_2_1.part)

    # Combine2: union Cut-Extrude19 piece 1, Cut-Extrude19 piece 3
    add(cut_extrude19_piece_1.part)
    add(cut_extrude19_piece_3_1.part)

    # Sketch30 → Cut-Extrude20 (cut)
    with SkipClean():  # the faces are left unmerged after this step: merging them gives an invalid solid
        with BuildSketch(Plane.XY.offset(3)):
            with Locations((0.015286251, -167.090958645)):
                Rectangle(SKETCH30_W, SKETCH30_H)
        extrude(amount=-CUT_EXTRUDE20_DEPTH, mode=Mode.SUBTRACT)

    # Fillet1
    fillet1_edges = [cut_extrude19_piece_2_2.edges().sort_by_distance(p)[0] for p in [
        (17, -150, 0.5),
        (-17, -150, 0.5),
    ]]
    fillet(fillet1_edges, radius=FILLET1_R)

    # Sketch31 → Cut-Extrude21 (cut)
    with SkipClean():  # the faces are left unmerged after this step: merging them gives an invalid solid
        with BuildSketch(Plane.ZY.offset(99)):
            with Locations((37.5, 0)):
                Circle(SKETCH31_R)
            with Locations((16.5, -12.124355653)):
                Circle(SKETCH31_R)
            with Locations((16.5, 12.124355653)):
                Circle(SKETCH31_R)
        extrude(amount=-CUT_EXTRUDE21_DEPTH, mode=Mode.SUBTRACT)


solid = cut_extrude19_piece_2_2.part
